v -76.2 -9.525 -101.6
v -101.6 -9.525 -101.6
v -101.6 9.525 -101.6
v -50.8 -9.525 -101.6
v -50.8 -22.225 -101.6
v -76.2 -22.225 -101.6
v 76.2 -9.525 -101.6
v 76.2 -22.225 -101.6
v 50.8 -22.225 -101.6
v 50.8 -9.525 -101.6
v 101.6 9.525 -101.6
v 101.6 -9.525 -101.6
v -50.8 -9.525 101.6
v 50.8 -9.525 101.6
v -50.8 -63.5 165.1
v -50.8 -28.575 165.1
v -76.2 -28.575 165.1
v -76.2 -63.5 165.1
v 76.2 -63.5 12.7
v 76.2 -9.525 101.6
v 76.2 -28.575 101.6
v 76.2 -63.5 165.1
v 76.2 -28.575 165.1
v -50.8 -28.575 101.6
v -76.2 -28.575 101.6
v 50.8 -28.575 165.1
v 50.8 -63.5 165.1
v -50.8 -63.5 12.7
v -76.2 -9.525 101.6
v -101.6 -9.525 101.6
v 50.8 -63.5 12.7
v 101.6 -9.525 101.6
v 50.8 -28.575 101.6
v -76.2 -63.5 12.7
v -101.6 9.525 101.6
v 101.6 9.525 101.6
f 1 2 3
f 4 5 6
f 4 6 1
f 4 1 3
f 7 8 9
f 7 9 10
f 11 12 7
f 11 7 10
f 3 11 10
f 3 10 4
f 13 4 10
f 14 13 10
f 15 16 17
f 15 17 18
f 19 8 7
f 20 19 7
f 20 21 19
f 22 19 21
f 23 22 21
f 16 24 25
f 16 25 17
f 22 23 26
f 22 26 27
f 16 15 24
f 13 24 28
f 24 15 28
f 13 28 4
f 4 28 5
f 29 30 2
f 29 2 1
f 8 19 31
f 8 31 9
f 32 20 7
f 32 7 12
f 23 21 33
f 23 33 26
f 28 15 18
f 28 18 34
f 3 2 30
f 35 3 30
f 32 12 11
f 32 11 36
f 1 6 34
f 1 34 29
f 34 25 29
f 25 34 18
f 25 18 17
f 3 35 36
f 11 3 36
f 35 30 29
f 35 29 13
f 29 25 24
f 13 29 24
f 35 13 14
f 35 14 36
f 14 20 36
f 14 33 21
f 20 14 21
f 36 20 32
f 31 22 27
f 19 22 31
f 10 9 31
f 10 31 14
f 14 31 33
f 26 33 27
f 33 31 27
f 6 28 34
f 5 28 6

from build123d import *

# Parameters (mm, degrees)
F0_W     = 203.2
F0_H     = 203.2
F1_DEPTH = 9.525
F3_DEPTH = 76.2
F4_W     = 38.1
F4_H     = 63.5
F5_DEPTH = 101.6
F6_W     = 101.6
F6_H     = 190.5
F6_H_2   = 152.4
F7_DEPTH = 53.975


with BuildPart() as f1:
    # F0 (on Front) → F1 (new body, symmetric)
    with BuildSketch(Plane.XZ):
        Rectangle(F0_W, F0_H)
    extrude(amount=F1_DEPTH, both=True)

    # F2 (on Right) → F3 (join, symmetric)
    with BuildSketch(Plane.YZ):
        Polygon((-9.525, -101.6), (-9.525, 165.1), (-63.5, 165.1), (-63.5, 12.7), (-22.225, -101.6), align=None)
    extrude(amount=F3_DEPTH, both=True)

    # F4 (on Right) → F5 (cut, symmetric)
    with BuildSketch(Plane.YZ):
        with Locations((-9.525, 133.35)):
            Rectangle(F4_W, F4_H)
    extrude(amount=F5_DEPTH, both=True, mode=Mode.SUBTRACT)

    # F6 (on face) → F7 (cut, through all)
    with BuildSketch(Plane.XZ.offset(63.5)):
        with Locations((0, -82.55)):
            Rectangle(F6_W, F6_H)
        with Locations((0, 88.9)):
            Rectangle(F6_W, F6_H_2)
    extrude(amount=-F7_DEPTH, mode=Mode.SUBTRACT)


solid = f1.part
